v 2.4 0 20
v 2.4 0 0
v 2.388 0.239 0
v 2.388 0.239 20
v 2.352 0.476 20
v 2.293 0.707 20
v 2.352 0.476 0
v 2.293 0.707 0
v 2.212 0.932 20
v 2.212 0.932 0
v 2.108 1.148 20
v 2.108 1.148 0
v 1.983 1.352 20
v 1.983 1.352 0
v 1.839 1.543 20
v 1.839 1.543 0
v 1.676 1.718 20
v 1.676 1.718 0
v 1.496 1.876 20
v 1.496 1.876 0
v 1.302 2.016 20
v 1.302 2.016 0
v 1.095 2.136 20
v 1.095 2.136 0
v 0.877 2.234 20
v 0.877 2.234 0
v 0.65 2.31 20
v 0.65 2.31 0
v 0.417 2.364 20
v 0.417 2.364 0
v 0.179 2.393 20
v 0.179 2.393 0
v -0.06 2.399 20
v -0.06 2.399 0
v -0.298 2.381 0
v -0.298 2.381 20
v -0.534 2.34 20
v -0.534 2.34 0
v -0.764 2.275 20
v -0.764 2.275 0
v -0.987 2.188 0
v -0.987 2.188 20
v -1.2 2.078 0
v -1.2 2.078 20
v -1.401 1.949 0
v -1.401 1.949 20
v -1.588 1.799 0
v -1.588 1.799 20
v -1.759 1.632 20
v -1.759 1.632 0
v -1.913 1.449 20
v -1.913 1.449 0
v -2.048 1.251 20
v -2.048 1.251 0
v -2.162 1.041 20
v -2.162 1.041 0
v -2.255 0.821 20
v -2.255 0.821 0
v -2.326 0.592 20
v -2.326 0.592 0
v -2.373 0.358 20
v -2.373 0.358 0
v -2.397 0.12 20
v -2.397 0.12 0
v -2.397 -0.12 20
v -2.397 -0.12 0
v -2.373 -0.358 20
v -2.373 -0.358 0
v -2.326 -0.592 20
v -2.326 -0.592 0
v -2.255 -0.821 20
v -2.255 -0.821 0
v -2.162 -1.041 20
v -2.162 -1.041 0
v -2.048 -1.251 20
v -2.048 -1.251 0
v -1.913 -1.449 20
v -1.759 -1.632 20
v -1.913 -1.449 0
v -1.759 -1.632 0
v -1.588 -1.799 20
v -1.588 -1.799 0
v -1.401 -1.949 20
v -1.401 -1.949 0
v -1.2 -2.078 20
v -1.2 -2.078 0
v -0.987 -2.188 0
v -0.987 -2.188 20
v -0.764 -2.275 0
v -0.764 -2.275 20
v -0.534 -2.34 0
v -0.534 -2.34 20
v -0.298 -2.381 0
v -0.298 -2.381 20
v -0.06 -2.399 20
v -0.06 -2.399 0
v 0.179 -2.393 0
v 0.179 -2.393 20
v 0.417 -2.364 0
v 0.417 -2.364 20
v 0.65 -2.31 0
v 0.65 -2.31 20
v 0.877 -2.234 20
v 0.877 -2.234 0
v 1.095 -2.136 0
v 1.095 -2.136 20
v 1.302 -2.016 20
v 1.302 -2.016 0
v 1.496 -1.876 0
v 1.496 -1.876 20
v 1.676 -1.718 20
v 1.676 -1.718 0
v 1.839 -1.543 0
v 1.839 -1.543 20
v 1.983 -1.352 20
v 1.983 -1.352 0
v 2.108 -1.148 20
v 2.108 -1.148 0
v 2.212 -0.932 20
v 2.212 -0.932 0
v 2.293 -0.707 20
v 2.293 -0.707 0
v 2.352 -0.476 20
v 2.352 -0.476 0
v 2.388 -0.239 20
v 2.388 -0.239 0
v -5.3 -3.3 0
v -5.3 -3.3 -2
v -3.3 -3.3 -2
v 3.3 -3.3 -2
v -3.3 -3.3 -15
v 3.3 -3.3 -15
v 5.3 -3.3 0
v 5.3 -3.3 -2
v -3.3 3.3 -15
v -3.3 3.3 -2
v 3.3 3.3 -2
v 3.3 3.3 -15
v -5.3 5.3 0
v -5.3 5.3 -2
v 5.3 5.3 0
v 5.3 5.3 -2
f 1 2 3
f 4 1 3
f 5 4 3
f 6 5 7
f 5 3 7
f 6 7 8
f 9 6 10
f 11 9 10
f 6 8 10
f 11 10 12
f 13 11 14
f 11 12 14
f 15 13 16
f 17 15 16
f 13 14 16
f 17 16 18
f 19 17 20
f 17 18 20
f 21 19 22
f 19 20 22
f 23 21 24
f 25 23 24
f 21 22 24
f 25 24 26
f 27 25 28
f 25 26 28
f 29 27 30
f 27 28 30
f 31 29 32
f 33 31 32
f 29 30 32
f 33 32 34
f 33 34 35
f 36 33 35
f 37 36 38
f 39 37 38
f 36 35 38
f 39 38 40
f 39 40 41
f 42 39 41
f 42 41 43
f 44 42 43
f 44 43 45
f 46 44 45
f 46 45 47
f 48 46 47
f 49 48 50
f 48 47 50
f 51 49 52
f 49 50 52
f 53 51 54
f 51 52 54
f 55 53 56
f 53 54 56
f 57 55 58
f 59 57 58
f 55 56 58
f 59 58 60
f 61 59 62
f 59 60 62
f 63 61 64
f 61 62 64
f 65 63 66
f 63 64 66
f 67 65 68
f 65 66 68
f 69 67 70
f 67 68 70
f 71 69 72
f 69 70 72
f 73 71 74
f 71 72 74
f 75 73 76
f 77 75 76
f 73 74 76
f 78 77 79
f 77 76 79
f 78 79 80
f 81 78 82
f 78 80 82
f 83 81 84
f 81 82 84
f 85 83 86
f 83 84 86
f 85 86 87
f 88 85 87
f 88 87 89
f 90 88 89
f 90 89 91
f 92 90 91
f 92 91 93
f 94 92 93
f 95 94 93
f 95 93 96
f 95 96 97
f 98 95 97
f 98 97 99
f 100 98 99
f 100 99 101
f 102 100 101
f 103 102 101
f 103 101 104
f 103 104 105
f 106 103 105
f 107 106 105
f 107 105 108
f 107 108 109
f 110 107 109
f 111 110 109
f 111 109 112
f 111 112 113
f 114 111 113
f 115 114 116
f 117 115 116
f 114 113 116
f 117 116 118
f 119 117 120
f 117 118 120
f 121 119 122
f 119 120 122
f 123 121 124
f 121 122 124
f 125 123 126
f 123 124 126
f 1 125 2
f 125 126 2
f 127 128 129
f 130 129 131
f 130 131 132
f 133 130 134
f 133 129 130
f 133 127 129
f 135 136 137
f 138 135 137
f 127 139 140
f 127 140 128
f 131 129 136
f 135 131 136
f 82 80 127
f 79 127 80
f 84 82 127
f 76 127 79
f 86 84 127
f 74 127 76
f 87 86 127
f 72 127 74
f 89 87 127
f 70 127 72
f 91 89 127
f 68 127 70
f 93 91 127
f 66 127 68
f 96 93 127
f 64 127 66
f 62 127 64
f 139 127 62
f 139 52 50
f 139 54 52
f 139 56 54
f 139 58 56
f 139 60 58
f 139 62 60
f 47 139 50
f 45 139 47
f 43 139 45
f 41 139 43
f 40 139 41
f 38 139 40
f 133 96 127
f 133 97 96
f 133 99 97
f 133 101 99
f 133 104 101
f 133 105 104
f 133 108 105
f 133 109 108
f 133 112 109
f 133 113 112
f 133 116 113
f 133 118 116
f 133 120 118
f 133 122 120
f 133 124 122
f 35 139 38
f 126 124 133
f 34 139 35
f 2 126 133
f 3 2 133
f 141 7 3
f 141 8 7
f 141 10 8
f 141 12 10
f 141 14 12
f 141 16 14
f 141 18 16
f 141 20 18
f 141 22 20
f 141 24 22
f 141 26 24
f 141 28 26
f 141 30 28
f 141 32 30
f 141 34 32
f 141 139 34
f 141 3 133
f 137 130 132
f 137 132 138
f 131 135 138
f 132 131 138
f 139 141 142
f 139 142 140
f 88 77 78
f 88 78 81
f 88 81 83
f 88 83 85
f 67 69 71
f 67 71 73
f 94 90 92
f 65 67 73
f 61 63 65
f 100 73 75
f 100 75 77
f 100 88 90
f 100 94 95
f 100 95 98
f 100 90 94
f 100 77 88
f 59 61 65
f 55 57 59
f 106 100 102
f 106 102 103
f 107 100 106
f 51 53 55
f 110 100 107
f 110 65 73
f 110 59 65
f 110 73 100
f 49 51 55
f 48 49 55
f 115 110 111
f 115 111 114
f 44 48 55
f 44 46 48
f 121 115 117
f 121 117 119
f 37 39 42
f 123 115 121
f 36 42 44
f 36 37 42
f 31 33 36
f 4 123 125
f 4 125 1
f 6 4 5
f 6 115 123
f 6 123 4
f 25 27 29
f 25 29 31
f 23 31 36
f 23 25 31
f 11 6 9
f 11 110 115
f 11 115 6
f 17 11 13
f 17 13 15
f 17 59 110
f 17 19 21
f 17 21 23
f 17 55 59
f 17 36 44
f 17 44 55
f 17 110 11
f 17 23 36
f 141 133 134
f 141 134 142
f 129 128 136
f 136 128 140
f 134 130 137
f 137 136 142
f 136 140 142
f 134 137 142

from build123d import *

# Parameters (mm, degrees)
SKETCH3_R           = 2.4
BOSS_EXTRUDE1_DEPTH = 20
SKETCH3_4_W         = 6.6
SKETCH3_4_H         = 6.6
BOSS_EXTRUDE2_DEPTH = 15
BOSS_EXTRUDE3_DEPTH = 2


with BuildPart() as part:
    # Sketch3 → Boss-Extrude1 (new body)
    with BuildSketch(Plane.XY):
        Circle(SKETCH3_R)
    extrude(amount=BOSS_EXTRUDE1_DEPTH)

    # Sketch3<4> → Boss-Extrude2 (add)
    with BuildSketch(Plane.XY):
        Rectangle(SKETCH3_4_W, SKETCH3_4_H)
    extrude(amount=-BOSS_EXTRUDE2_DEPTH)

    # Sketch3<5> → Boss-Extrude3 (add)
    with BuildSketch(Plane.XY):
        Polygon((-5.3, -3.3), (-3.3, -3.3), (-3.3, 3.3), (3.3, 3.3), (3.3, -3.3), (5.3, -3.3), (5.3, 5.3), (-5.3, 5.3), align=None)
    extrude(amount=-BOSS_EXTRUDE3_DEPTH)


solid = part.part
